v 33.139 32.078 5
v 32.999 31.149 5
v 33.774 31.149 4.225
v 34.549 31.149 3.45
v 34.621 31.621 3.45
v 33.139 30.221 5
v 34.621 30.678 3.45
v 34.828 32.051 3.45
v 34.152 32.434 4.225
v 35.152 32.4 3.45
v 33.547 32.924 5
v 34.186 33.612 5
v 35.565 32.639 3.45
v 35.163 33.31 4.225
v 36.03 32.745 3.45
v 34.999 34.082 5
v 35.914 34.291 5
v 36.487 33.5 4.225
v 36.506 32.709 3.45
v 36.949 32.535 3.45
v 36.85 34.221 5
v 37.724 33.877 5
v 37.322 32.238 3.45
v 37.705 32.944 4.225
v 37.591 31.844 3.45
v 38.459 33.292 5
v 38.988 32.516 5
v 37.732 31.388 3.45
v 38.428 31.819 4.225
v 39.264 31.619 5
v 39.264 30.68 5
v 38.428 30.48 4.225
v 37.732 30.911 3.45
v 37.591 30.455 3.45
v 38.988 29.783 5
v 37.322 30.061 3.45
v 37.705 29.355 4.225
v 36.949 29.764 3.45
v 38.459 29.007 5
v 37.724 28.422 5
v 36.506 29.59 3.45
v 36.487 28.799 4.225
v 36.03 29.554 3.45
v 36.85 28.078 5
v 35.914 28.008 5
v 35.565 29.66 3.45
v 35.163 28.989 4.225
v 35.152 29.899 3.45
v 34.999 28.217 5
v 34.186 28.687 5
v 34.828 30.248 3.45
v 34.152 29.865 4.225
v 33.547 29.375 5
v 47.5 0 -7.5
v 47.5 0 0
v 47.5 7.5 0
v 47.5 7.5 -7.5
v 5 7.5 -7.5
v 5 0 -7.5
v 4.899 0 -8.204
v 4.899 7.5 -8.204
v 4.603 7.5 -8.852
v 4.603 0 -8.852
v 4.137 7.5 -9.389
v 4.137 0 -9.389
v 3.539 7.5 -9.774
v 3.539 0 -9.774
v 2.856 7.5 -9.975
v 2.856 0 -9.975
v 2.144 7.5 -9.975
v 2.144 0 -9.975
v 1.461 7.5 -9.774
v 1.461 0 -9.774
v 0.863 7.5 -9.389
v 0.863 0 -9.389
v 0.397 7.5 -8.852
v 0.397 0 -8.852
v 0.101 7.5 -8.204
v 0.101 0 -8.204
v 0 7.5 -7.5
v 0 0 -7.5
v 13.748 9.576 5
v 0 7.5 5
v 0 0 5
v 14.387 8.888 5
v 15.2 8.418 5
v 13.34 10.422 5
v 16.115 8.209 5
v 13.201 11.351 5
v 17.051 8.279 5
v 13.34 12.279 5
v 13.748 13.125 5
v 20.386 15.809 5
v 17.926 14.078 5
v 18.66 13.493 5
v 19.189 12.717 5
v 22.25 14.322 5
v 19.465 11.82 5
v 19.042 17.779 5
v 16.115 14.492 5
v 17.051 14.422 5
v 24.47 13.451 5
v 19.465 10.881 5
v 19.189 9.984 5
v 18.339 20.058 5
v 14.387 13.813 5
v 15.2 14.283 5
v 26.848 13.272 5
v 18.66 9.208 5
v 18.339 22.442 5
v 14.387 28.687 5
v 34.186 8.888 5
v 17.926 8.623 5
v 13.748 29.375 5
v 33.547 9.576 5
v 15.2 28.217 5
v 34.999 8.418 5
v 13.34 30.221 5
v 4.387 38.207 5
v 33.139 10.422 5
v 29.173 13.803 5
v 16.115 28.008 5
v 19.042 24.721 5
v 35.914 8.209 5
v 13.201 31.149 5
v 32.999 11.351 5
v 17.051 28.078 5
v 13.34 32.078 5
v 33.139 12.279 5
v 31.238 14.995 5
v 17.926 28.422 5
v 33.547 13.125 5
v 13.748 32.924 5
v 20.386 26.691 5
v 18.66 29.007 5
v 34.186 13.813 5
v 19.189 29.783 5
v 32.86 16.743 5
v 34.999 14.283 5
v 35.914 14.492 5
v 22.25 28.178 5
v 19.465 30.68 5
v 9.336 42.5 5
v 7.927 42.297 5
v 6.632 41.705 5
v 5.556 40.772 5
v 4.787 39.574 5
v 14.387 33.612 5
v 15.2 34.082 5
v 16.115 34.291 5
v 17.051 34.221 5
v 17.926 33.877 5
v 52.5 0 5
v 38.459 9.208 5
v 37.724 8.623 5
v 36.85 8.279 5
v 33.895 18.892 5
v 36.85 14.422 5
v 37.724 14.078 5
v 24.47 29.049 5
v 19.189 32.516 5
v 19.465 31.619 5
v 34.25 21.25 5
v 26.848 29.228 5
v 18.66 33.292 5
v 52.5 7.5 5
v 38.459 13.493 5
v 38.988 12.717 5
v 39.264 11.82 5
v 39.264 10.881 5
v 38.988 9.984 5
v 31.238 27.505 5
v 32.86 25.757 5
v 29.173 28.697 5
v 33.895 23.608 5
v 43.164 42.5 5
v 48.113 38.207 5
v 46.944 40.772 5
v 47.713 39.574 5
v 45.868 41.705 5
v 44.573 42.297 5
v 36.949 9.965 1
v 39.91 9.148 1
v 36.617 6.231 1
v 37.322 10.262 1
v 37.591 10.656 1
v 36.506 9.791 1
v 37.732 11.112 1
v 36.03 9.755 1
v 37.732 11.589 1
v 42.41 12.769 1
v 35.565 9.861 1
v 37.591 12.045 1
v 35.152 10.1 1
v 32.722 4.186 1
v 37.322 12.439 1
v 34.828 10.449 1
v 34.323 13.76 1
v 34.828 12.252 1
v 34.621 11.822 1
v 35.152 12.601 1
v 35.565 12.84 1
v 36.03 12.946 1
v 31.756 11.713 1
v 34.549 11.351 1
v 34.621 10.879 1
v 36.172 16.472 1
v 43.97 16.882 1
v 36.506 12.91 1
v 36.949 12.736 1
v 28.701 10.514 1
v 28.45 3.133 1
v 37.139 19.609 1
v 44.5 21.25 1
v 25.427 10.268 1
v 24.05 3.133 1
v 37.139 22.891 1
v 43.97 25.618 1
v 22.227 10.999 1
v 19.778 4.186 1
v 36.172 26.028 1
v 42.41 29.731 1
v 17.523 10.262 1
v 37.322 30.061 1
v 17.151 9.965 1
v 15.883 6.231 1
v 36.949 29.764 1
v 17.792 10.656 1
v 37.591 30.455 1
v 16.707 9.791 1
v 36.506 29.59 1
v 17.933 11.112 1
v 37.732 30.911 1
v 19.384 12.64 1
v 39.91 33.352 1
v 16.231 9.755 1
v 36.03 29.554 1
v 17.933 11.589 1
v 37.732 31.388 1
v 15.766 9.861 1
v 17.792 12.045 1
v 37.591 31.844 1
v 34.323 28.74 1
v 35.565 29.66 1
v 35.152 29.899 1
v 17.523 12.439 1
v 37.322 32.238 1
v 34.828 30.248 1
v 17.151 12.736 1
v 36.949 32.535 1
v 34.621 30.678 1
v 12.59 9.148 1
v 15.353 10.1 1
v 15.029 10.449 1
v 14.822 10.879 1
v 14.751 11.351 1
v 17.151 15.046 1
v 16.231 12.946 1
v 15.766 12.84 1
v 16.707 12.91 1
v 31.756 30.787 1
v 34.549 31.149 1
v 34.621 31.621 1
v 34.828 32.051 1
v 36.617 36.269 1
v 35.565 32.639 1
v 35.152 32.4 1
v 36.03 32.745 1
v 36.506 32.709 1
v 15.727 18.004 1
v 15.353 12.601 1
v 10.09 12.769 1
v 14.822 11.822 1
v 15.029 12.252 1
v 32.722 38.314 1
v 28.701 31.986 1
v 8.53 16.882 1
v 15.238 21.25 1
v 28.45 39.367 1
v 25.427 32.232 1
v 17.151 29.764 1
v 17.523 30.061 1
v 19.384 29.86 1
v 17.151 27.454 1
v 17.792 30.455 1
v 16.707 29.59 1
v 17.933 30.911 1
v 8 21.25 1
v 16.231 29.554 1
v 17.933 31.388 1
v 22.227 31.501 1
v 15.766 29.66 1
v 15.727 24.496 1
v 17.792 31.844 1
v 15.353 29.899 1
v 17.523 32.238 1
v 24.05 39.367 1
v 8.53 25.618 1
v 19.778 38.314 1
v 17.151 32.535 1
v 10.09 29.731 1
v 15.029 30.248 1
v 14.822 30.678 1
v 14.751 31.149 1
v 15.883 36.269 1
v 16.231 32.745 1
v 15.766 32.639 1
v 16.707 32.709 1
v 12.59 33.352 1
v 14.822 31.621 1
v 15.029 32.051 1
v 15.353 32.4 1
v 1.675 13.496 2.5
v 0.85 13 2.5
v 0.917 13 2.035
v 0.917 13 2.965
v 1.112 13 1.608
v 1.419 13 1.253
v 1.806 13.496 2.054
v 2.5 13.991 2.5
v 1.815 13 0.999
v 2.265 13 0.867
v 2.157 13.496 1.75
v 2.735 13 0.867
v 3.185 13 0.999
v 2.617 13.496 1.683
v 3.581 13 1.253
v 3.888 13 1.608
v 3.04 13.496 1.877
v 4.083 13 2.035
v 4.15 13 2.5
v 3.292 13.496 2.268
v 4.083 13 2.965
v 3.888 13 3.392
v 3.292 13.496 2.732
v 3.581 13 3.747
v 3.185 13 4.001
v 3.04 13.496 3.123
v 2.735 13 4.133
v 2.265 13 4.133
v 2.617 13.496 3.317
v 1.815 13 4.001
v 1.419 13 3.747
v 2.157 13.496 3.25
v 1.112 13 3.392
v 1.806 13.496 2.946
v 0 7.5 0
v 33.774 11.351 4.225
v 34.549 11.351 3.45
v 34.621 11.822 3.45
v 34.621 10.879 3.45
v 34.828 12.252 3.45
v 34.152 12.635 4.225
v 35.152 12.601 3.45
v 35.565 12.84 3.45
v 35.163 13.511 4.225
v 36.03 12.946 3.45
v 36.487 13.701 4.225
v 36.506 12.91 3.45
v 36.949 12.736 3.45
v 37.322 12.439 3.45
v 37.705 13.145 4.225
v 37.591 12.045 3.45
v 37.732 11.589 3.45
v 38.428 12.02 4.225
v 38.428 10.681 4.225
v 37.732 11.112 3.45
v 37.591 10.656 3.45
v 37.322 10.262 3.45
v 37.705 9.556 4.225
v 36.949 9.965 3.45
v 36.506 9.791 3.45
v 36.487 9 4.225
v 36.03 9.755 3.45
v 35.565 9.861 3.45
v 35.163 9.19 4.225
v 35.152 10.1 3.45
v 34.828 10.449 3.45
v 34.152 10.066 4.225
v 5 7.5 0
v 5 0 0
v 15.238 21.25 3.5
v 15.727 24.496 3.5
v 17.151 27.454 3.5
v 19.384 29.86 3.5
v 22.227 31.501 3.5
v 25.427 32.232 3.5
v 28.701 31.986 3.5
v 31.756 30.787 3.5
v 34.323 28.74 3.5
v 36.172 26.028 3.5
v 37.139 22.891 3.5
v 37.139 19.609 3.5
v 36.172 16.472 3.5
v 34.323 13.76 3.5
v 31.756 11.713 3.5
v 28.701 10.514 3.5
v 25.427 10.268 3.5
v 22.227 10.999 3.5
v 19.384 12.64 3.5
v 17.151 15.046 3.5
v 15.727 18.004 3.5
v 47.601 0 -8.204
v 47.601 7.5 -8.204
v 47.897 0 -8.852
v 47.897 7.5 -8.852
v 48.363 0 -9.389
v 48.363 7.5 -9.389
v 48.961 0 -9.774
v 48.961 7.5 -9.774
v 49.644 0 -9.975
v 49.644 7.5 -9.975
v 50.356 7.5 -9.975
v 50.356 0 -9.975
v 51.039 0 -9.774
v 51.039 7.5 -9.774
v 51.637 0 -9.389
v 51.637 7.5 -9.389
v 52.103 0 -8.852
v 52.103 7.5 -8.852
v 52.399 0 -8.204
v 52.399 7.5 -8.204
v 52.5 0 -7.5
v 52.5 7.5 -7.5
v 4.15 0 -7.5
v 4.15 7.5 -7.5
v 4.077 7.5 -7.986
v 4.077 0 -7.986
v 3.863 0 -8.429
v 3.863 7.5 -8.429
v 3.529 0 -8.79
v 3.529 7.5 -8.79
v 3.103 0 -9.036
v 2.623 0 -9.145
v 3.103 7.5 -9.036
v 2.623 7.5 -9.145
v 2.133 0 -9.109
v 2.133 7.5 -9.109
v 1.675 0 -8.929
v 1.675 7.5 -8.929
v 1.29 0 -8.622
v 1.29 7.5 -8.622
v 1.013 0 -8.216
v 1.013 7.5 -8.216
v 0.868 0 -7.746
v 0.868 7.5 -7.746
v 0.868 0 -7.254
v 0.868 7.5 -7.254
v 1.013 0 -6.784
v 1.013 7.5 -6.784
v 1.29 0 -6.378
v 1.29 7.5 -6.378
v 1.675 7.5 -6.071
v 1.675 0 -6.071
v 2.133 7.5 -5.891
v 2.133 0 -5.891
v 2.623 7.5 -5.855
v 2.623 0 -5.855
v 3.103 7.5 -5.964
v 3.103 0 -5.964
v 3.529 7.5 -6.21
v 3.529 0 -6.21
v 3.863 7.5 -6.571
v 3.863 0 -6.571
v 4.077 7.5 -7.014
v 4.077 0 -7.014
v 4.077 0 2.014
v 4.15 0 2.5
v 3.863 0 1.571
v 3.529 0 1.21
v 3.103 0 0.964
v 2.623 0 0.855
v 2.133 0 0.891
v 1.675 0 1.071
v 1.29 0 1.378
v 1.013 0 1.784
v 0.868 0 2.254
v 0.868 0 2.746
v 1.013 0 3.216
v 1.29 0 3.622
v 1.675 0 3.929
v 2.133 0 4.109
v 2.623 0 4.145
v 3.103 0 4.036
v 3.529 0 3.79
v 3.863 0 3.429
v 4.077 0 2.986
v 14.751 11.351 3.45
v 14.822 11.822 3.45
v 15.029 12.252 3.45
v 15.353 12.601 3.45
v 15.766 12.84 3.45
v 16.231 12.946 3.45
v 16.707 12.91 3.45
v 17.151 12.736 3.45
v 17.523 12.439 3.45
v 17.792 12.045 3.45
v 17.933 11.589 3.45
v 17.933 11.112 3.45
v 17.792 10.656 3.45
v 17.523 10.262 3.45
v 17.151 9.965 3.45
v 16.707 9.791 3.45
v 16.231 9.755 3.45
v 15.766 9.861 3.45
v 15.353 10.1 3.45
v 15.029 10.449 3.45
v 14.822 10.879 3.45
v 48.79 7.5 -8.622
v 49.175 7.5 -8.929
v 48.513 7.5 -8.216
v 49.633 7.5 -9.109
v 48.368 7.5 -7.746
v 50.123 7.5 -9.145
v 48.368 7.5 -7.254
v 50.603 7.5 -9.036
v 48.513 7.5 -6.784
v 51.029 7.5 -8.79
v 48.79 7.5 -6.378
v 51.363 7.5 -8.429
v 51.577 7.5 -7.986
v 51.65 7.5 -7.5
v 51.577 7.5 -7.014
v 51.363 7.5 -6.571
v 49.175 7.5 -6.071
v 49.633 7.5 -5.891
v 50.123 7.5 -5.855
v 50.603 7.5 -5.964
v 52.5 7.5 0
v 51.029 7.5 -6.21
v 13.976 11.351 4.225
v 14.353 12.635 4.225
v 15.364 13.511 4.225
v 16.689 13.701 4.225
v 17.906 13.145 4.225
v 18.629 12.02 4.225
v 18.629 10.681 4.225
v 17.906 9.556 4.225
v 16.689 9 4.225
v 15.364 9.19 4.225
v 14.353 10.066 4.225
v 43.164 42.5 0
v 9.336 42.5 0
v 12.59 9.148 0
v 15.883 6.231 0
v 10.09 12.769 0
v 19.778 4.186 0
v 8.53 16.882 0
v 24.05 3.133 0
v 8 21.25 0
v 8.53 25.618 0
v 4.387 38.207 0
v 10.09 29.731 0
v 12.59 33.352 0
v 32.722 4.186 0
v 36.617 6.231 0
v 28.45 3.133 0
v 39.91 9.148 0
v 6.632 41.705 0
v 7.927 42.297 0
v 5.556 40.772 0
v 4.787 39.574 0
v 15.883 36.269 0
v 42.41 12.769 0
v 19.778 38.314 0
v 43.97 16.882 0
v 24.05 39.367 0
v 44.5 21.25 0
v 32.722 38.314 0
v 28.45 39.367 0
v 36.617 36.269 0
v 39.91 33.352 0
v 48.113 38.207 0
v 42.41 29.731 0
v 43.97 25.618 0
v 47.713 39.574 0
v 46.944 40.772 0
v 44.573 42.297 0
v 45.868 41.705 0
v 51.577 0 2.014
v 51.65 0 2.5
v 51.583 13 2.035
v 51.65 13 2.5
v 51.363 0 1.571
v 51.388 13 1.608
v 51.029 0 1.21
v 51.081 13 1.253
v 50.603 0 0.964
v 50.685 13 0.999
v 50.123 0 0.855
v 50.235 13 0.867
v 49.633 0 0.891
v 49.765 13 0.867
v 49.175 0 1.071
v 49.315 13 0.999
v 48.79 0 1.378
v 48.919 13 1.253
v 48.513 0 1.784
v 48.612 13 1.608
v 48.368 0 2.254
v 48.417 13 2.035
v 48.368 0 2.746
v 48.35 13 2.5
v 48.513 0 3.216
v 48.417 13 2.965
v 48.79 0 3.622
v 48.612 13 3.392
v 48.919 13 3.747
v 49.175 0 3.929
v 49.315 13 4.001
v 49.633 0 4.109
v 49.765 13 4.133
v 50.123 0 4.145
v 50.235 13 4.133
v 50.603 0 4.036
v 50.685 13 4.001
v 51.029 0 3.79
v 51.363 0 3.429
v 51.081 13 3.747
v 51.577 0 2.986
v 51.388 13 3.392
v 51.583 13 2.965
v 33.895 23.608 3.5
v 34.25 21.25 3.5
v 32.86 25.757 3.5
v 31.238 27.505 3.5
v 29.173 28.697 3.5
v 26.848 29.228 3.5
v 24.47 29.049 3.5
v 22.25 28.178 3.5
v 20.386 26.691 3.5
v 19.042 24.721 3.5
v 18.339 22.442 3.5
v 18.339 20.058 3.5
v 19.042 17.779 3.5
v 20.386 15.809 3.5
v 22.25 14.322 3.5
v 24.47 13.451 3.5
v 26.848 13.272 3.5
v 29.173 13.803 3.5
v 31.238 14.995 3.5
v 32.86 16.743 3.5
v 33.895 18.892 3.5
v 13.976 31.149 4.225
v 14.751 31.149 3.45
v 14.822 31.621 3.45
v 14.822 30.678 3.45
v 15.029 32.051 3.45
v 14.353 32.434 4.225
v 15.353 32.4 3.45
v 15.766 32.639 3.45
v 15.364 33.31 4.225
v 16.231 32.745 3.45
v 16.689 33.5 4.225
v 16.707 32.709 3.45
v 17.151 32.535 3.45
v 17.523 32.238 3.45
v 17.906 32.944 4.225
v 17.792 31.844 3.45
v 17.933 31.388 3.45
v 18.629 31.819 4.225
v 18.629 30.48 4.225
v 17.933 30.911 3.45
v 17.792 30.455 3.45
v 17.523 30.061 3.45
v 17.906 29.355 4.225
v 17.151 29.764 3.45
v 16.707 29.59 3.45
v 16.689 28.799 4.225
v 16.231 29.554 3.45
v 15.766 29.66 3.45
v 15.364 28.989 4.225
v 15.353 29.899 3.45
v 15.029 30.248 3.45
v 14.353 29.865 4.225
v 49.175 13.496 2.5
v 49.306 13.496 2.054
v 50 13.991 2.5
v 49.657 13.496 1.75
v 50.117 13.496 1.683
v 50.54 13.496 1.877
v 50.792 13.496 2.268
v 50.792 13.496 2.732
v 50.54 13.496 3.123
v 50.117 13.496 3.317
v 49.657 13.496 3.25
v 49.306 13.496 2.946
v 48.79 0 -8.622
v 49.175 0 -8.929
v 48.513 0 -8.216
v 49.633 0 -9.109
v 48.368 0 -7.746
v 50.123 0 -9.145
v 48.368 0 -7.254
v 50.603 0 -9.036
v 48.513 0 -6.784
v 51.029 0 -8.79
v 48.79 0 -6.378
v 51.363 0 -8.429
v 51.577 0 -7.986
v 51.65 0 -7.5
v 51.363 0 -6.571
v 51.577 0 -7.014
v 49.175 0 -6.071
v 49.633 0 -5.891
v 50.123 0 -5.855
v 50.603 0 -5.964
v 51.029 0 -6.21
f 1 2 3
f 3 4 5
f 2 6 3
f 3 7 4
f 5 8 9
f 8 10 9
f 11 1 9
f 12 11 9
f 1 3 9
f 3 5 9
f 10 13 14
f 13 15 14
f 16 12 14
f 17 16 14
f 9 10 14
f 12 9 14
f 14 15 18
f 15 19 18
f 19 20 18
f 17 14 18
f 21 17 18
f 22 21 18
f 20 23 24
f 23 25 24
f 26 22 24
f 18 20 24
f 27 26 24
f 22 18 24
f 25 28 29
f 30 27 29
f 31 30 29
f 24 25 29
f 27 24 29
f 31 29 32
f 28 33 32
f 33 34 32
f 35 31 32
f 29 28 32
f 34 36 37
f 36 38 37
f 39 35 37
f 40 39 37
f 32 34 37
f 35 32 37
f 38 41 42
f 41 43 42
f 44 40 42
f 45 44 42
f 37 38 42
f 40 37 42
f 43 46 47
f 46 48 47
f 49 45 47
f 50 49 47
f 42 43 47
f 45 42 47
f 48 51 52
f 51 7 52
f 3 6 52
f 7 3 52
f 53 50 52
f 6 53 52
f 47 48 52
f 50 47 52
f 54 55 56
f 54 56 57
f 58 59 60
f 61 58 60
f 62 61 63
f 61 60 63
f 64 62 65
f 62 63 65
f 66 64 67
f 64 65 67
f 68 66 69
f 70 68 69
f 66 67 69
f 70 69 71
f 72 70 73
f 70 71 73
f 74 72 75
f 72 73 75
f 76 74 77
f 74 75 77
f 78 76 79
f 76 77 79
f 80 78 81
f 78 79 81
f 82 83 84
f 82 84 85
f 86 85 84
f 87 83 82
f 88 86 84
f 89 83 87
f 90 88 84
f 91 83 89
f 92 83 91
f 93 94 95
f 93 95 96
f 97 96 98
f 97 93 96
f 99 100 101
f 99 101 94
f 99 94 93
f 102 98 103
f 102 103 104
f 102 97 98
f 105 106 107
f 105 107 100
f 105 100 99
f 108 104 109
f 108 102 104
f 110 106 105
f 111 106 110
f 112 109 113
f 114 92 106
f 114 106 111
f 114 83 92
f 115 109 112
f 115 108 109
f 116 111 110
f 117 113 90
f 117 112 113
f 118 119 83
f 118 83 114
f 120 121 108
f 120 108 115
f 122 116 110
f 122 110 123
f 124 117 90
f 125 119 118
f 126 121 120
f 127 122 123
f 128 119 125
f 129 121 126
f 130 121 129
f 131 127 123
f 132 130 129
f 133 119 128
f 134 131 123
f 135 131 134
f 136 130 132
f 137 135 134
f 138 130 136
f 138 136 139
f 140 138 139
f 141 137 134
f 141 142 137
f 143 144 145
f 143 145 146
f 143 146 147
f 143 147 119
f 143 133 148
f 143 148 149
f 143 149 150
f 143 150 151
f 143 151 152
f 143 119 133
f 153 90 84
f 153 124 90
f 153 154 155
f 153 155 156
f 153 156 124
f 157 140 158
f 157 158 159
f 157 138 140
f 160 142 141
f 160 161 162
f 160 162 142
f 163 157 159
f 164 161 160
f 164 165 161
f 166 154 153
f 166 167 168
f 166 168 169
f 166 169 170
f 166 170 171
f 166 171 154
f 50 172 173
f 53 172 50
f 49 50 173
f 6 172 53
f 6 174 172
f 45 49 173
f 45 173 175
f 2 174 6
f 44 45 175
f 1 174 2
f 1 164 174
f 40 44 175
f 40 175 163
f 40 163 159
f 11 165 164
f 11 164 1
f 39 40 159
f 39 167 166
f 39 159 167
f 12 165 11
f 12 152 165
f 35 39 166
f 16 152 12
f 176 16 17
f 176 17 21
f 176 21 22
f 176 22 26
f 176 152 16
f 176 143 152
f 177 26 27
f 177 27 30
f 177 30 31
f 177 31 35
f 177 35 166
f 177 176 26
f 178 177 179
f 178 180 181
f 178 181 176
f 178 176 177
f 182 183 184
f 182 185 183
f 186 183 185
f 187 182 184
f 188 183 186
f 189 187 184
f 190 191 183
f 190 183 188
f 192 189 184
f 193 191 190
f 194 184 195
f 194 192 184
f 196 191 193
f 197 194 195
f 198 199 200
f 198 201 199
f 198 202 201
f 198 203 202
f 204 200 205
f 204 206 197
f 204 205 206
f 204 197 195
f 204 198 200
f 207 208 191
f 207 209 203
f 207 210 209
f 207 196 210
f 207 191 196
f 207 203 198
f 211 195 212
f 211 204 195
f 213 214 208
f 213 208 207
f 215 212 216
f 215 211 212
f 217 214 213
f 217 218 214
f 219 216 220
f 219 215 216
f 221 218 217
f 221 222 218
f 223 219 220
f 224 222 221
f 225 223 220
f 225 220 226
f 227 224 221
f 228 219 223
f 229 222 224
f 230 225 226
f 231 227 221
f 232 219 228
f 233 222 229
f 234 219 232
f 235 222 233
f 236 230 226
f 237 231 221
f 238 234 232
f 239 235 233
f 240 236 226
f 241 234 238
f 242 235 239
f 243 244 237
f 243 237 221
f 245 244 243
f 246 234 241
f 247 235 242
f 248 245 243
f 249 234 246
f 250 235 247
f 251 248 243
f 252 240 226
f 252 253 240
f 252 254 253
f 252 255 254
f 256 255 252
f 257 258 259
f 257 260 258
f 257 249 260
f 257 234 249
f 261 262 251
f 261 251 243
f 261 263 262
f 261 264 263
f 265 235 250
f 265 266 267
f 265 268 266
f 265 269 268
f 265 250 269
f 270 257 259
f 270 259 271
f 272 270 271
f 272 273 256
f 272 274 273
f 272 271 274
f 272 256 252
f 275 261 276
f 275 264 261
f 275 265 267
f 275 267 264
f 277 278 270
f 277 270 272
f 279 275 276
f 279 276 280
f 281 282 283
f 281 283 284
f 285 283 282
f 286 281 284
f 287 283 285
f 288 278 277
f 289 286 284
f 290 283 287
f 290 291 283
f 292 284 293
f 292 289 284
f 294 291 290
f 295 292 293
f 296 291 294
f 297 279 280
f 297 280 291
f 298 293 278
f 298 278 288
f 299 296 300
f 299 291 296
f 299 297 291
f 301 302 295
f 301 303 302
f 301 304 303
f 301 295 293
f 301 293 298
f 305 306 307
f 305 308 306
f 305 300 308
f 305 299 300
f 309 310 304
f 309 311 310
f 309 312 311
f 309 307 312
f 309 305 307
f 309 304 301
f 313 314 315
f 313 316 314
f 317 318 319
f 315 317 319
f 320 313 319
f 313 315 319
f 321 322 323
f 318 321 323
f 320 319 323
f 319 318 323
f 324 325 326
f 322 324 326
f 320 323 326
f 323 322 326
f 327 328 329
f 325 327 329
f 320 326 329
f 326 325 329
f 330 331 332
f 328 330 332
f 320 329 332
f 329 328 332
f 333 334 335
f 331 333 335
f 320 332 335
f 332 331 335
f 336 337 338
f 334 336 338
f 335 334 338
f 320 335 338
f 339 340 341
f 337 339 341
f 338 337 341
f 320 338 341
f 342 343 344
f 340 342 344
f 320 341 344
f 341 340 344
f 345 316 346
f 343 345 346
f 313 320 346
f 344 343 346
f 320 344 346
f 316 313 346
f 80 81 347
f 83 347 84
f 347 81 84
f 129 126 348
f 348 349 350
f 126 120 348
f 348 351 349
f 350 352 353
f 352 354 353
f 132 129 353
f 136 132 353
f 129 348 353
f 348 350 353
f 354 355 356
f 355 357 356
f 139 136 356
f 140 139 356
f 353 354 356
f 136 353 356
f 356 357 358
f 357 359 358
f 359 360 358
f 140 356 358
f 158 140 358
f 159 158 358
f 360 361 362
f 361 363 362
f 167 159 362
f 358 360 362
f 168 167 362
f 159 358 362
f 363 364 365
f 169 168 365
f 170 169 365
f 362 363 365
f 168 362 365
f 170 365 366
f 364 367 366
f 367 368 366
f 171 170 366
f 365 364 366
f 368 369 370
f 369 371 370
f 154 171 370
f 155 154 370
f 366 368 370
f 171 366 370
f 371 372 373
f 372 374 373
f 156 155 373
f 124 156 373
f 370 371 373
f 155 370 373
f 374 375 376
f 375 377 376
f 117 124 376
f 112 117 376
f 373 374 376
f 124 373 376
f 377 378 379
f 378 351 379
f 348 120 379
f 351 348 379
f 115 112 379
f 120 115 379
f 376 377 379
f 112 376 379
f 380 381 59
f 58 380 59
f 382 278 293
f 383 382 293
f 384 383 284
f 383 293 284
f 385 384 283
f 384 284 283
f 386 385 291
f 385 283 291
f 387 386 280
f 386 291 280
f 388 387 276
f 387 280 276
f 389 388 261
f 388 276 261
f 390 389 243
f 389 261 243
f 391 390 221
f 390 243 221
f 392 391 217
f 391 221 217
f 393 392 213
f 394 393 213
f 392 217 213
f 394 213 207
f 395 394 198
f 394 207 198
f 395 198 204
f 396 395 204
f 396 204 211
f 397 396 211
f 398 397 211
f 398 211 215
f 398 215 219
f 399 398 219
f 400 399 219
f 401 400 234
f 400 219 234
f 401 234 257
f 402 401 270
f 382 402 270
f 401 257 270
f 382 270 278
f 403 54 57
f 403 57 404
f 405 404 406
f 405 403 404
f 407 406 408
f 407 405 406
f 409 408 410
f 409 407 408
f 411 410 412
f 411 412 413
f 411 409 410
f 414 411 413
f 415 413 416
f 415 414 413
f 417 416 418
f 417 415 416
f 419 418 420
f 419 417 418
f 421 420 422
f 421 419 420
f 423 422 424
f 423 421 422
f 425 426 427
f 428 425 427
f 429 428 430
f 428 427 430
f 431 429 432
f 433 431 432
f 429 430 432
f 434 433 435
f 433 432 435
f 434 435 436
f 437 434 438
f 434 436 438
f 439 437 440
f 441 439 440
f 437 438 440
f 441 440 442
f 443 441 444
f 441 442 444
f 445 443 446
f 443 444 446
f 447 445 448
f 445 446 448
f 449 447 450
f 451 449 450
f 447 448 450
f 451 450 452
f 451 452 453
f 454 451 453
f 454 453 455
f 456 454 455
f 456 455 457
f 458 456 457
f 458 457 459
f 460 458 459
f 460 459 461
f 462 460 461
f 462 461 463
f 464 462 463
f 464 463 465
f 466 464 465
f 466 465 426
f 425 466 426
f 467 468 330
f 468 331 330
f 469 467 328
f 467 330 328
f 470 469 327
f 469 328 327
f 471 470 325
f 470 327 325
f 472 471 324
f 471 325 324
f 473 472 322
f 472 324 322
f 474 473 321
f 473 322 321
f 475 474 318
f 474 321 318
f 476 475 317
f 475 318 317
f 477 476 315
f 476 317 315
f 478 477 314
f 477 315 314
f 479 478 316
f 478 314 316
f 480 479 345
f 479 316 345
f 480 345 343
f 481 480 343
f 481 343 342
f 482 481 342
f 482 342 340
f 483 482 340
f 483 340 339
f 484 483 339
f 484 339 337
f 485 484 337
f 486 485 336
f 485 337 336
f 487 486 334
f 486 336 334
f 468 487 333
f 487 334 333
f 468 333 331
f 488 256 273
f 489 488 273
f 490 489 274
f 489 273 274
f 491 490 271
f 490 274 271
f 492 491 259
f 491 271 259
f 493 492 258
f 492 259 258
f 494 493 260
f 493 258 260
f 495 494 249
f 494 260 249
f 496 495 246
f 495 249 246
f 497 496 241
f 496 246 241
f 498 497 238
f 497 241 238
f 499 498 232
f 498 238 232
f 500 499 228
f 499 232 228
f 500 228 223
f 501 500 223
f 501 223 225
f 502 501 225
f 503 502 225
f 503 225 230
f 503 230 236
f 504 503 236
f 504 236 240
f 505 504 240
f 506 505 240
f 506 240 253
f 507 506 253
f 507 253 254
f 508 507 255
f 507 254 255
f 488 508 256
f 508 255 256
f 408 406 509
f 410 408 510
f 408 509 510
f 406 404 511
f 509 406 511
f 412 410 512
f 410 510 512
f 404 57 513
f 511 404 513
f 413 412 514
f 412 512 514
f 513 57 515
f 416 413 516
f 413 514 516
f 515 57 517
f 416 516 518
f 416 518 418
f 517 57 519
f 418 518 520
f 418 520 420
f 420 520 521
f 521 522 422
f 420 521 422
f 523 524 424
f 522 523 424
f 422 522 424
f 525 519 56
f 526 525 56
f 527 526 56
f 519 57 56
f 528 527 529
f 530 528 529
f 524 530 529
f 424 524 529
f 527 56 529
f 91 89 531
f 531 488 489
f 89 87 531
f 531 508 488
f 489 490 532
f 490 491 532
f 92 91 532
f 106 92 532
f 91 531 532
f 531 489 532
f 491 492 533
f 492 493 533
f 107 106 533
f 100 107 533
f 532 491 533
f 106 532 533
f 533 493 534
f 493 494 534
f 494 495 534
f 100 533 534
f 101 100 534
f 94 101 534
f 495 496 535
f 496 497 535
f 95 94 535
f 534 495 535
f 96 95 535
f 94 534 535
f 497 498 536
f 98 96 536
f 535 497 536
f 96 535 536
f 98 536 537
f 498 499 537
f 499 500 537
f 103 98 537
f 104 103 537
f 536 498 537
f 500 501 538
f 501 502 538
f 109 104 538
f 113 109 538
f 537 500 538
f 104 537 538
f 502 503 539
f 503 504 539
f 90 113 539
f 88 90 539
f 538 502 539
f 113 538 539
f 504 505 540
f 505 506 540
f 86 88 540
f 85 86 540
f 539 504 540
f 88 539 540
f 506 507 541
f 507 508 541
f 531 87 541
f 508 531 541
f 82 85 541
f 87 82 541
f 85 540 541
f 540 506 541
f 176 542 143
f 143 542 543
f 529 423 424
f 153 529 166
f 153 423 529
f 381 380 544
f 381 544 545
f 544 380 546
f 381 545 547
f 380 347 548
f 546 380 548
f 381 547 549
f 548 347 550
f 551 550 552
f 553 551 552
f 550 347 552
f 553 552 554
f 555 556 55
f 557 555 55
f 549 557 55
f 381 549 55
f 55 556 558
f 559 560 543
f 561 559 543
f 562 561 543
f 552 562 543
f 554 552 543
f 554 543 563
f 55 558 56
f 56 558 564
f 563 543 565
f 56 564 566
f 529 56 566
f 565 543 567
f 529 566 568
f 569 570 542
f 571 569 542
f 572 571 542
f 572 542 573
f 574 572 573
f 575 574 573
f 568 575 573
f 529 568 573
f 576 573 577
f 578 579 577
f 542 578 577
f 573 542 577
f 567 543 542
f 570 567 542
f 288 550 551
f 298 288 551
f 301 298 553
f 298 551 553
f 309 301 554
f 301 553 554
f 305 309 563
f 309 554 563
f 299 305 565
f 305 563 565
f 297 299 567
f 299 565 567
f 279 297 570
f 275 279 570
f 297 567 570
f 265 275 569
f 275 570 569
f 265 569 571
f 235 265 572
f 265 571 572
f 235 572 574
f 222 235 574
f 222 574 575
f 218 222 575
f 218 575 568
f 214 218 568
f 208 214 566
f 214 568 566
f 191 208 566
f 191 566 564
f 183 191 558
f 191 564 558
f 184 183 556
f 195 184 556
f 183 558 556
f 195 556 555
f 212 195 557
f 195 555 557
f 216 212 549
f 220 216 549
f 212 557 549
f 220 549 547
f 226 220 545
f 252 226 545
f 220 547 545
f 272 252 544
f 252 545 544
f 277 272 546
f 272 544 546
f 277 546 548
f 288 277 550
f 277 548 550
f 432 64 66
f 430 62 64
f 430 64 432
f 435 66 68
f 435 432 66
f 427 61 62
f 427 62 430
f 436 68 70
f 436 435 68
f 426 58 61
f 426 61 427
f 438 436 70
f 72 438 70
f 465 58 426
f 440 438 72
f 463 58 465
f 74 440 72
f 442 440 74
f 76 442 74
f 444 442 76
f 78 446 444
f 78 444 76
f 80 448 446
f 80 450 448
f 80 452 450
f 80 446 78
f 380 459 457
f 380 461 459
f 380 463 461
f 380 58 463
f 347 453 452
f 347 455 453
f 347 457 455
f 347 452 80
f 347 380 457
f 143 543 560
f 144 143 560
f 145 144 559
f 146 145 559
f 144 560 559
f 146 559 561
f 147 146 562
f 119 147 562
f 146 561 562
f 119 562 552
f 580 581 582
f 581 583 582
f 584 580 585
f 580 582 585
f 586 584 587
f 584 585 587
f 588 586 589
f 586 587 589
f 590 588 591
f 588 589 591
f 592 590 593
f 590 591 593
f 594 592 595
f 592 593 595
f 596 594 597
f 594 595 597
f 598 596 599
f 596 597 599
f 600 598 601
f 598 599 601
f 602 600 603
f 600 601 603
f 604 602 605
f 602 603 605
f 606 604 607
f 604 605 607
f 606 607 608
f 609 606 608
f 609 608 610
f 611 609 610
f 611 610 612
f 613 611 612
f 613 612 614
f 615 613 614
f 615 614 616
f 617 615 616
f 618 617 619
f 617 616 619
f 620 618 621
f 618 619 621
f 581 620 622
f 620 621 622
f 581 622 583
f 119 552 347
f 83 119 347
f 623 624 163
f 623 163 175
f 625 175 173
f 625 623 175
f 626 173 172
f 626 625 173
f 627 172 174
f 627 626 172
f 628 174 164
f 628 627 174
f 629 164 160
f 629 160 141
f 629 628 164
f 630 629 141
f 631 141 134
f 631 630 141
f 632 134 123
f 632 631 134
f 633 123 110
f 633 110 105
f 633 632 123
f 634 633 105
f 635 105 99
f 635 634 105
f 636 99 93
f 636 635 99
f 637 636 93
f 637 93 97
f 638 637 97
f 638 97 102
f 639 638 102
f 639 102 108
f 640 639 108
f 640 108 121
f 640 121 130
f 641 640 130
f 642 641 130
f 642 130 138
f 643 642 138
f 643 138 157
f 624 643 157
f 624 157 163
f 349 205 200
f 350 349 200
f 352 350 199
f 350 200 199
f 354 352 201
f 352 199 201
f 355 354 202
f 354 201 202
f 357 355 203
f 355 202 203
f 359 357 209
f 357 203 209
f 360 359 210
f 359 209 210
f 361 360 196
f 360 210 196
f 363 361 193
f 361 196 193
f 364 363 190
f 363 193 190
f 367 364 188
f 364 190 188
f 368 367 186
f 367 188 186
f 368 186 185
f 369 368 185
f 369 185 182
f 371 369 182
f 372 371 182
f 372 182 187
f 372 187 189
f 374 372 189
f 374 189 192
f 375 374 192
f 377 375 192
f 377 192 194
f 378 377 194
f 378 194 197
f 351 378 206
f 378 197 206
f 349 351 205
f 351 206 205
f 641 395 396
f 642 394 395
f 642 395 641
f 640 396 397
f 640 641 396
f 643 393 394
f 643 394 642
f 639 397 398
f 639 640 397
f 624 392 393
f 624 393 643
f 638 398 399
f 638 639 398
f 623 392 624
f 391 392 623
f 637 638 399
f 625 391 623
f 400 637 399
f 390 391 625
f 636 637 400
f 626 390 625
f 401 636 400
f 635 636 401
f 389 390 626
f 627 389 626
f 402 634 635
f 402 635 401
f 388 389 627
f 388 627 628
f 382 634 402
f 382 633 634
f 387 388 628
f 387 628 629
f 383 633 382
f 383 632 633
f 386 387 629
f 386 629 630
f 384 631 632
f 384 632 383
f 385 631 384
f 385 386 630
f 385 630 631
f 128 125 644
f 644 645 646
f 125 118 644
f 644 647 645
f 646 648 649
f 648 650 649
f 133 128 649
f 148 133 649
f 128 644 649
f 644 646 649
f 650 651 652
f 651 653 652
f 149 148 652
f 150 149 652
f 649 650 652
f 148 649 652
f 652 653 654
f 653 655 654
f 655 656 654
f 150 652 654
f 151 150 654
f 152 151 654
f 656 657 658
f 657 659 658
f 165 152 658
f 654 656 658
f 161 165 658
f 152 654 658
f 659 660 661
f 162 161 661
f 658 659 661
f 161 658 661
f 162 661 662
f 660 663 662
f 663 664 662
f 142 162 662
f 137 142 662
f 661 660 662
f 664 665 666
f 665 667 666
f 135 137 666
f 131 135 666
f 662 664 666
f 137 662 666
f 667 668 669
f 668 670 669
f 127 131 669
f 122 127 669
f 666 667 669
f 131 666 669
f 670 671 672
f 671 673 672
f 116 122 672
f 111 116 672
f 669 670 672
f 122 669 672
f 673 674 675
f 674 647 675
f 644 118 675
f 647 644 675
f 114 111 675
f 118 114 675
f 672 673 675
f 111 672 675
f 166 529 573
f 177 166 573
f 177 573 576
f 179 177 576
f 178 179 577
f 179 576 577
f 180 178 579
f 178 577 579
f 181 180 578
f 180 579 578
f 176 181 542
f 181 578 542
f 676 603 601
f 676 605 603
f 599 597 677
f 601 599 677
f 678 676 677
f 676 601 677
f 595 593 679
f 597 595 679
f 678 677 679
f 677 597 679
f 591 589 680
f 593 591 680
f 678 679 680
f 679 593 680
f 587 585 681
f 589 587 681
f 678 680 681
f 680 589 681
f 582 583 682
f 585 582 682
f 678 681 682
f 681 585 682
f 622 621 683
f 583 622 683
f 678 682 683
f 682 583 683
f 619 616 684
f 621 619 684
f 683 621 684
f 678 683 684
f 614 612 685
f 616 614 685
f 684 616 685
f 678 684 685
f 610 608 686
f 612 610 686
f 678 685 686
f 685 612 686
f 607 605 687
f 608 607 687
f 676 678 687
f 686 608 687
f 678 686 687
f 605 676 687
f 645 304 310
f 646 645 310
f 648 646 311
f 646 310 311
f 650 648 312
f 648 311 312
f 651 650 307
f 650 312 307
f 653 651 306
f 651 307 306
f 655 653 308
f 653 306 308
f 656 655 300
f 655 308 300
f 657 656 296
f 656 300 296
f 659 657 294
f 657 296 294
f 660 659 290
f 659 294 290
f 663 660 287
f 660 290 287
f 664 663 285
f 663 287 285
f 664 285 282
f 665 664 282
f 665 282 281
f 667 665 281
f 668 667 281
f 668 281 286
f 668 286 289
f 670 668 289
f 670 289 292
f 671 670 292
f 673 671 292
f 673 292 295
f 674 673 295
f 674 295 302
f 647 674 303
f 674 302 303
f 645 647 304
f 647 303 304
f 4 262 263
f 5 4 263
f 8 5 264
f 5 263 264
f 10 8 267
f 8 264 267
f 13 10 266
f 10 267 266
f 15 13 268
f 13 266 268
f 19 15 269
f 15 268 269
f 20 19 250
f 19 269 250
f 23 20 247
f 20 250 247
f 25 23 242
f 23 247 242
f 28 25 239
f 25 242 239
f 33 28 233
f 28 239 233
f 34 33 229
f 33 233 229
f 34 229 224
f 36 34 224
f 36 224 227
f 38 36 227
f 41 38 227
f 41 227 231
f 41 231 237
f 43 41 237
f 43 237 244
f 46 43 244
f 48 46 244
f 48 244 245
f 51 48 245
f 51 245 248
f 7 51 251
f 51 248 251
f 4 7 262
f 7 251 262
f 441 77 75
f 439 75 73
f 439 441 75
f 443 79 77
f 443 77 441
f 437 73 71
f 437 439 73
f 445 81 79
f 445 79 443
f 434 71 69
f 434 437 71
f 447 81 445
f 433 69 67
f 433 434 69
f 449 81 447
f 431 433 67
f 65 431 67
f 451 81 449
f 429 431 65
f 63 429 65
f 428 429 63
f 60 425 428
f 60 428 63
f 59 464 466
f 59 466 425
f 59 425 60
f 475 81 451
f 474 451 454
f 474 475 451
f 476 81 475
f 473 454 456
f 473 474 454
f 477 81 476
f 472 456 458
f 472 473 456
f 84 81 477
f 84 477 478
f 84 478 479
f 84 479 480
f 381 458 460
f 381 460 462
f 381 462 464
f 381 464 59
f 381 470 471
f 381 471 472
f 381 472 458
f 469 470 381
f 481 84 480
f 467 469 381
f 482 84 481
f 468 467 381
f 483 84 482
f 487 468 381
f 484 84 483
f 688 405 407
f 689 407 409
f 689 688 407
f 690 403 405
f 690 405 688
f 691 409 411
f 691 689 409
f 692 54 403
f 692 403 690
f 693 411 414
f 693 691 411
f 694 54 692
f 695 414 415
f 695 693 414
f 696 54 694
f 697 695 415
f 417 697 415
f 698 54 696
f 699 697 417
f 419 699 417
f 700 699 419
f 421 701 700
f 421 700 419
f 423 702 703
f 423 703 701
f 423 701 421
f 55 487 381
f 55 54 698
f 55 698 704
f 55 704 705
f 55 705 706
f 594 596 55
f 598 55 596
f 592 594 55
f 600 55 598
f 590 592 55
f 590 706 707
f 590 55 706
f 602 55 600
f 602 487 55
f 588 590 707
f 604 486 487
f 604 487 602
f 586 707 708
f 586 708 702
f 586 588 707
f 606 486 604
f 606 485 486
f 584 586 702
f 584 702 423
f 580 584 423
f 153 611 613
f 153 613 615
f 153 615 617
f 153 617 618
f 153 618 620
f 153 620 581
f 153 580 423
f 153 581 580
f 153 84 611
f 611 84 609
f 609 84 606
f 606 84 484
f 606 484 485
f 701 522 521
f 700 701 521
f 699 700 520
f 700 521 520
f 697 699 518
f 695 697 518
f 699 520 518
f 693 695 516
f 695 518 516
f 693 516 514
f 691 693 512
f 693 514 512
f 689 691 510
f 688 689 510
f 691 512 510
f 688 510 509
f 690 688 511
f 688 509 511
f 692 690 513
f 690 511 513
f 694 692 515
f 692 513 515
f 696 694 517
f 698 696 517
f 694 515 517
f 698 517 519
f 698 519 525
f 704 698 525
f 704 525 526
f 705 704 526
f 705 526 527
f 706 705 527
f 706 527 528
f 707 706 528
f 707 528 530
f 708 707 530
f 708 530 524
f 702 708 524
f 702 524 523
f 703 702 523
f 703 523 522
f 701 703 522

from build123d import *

# Parameters (mm, degrees)
SKIZZE1_R                                            = 8
AUFSATZ_LINEAR_AUSTRAGEN1_DEPTH                      = 5
AUFSATZ_LINEAR_AUSTRAGEN2_DEPTH                      = 7.5
FORMSENKUNG_F_R_M3_SENKSCHRAUBE_MIT_SCHL_D           = 3.2
FORMSENKUNG_F_R_M3_SENKSCHRAUBE_MIT_SCHL_CSINK_D     = 6.3
FORMSENKUNG_F_R_M3_SENKSCHRAUBE_MIT_SCHL_CSINK_ANGLE = 90
M4_GEWINDEBOHRUNG2_D                                 = 3.3
M4_GEWINDEBOHRUNG2_DEPTH                             = 13
M4_GEWINDEBOHRUNG2_TIP                               = 0.991420021
SKIZZE15_R                                           = 18.25
SCHNITT_LINEAR_AUSTRAGEN1_DEPTH                      = 1
SKIZZE16_R                                           = 11.0125
SCHNITT_LINEAR_AUSTRAGEN2_DEPTH                      = 2.5


with BuildPart() as part:
    # Skizze1 → Aufsatz-Linear austragen1 (new body)
    with BuildSketch(Plane.XY):
        with BuildLine():
            Line((0, 0), (52.5, 0))
            Line((52.5, 0), (52.5, 7.5))
            Line((52.5, 7.5), (48.11327046, 38.207106781))
            ThreePointArc((48.11327046, 38.207106781), (46.439531698, 41.277269775), (43.163522992, 42.5))
            Line((43.163522992, 42.5), (9.336477008, 42.5))
            ThreePointArc((9.336477008, 42.5), (6.060468302, 41.277269775), (4.38672954, 38.207106781))
            Line((4.38672954, 38.207106781), (0, 7.5))
            Line((0, 7.5), (0, 0))
        make_face()
        with Locations((26.25, 21.25)):
            Circle(SKIZZE1_R, mode=Mode.SUBTRACT)
    extrude(amount=AUFSATZ_LINEAR_AUSTRAGEN1_DEPTH)

    # Skizze4 → Aufsatz-Linear austragen2 (add)
    with BuildSketch(Plane.XZ):
        with BuildLine():
            Line((52.5, 0), (47.5, 0))
            Line((47.5, 0), (47.5, -7.5))
            ThreePointArc((47.5, -7.5), (50, -10), (52.5, -7.5))
            Line((52.5, -7.5), (52.5, 0))
        make_face()
        with BuildLine():
            Line((0, 0), (5, 0))
            Line((5, 0), (5, -7.5))
            ThreePointArc((5, -7.5), (2.5, -10), (0, -7.5))
            Line((0, -7.5), (0, 0))
        make_face()
    extrude(amount=-AUFSATZ_LINEAR_AUSTRAGEN2_DEPTH)

    # Formsenkung für M3 Senkschraube mit Schlitz/Kreuzschlitz1 (through all)
    with Locations(Plane.XY.offset(5)):
        with Locations((16.350505063, 31.149494937), (36.149494937, 11.350505063), (16.350505063, 11.350505063), (36.149494937, 31.149494937)):
            CounterSinkHole(FORMSENKUNG_F_R_M3_SENKSCHRAUBE_MIT_SCHL_D / 2, FORMSENKUNG_F_R_M3_SENKSCHRAUBE_MIT_SCHL_CSINK_D / 2, counter_sink_angle=FORMSENKUNG_F_R_M3_SENKSCHRAUBE_MIT_SCHL_CSINK_ANGLE)

    # M4 Gewindebohrung2
    with Locations(Plane(origin=(0, 0, 0), x_dir=(-1, 0, 0), z_dir=(0, -1, 0))):
        with Locations((-2.5, 7.5), (-50, 7.5), (-50, -2.5), (-2.5, -2.5)):
            Hole(M4_GEWINDEBOHRUNG2_D / 2, depth=M4_GEWINDEBOHRUNG2_DEPTH)
            with Locations((0, 0, -(M4_GEWINDEBOHRUNG2_DEPTH + M4_GEWINDEBOHRUNG2_TIP / 2))):  # 118° drill point
                Cone(0, M4_GEWINDEBOHRUNG2_D / 2, M4_GEWINDEBOHRUNG2_TIP, mode=Mode.SUBTRACT)

    # Skizze15 → Schnitt-Linear austragen1 (cut)
    with BuildSketch(Plane(origin=(0, 0, 0), x_dir=(-1, 0, 0), z_dir=(0, 0, -1))):
        with Locations((-26.25, 21.25)):
            Circle(SKIZZE15_R)
    extrude(amount=-SCHNITT_LINEAR_AUSTRAGEN1_DEPTH, mode=Mode.SUBTRACT)

    # Skizze16 → Schnitt-Linear austragen2 (cut)
    with BuildSketch(Plane(origin=(0, 0, 1), x_dir=(-1, 0, 0), z_dir=(0, 0, -1))):
        with Locations((-26.25, 21.25)):
            Circle(SKIZZE16_R)
    extrude(amount=-SCHNITT_LINEAR_AUSTRAGEN2_DEPTH, mode=Mode.SUBTRACT)


solid = part.part
